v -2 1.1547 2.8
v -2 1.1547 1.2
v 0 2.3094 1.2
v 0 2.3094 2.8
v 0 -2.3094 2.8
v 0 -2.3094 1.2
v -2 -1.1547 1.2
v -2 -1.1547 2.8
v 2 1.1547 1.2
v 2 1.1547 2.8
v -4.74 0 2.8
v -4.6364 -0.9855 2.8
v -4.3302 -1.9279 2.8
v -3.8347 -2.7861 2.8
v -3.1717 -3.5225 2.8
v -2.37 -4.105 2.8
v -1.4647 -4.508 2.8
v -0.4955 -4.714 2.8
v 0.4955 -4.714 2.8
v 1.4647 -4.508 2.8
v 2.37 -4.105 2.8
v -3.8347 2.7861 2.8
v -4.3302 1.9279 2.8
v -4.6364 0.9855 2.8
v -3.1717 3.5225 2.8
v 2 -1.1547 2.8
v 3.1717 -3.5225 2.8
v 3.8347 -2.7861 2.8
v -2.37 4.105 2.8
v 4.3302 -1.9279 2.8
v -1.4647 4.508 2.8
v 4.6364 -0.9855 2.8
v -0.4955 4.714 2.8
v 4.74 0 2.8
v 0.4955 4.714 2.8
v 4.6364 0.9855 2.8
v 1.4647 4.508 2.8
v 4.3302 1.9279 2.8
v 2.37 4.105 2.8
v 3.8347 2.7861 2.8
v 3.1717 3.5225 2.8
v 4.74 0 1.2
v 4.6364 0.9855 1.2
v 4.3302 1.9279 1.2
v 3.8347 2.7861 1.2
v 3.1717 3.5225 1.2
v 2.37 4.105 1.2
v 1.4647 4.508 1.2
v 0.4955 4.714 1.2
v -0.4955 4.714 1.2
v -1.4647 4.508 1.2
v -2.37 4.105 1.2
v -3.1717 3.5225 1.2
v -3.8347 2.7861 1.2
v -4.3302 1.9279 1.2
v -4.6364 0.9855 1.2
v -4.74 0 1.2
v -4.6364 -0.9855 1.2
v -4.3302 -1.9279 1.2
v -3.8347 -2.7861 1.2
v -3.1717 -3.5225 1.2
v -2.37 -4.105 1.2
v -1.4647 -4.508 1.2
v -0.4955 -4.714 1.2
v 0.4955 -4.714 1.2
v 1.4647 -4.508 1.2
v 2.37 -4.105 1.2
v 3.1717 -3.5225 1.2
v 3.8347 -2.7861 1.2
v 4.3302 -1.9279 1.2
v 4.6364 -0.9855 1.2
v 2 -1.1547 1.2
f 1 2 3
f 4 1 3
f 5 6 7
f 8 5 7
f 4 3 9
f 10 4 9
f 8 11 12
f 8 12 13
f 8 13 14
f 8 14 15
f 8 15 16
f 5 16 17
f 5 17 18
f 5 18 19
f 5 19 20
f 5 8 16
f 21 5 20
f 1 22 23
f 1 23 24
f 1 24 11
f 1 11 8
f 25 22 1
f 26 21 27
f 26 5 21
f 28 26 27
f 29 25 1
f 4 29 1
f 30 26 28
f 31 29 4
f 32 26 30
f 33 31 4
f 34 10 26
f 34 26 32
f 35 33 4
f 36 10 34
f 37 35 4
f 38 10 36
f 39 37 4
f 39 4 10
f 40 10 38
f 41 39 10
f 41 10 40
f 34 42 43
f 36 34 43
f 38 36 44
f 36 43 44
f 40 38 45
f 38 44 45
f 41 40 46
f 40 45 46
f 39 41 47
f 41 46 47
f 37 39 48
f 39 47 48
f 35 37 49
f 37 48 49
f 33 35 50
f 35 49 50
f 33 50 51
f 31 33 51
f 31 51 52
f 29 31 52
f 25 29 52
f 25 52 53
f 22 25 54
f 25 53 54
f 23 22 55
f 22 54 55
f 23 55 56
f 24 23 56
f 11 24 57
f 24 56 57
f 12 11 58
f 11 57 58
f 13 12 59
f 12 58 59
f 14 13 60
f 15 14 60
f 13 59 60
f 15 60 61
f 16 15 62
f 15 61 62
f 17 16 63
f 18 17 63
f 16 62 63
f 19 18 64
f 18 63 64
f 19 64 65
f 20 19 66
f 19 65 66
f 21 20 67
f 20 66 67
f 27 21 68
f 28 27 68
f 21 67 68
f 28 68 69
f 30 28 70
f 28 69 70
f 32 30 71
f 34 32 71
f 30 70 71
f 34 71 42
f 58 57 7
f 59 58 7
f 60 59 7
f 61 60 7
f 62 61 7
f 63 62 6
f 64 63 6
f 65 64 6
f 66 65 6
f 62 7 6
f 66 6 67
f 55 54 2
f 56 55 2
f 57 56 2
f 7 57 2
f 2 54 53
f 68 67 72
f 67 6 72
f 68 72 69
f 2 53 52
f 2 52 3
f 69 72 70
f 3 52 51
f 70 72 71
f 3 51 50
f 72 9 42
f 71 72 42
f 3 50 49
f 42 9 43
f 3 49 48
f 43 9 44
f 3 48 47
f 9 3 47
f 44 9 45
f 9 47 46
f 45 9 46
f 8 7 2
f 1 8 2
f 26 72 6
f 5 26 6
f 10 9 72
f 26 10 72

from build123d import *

# Parameters (mm, degrees)
SKETCH1_R           = 11.85
BOSS_EXTRUDE1_DEPTH = 4
CUT_EXTRUDE1_DEPTH  = 18.229190347
SCALE1_SCALE        = 0.4


with BuildPart() as part:
    # Sketch1 → Boss-Extrude1 (new body)
    with BuildSketch(Plane.XY):
        Circle(SKETCH1_R)
    extrude(amount=BOSS_EXTRUDE1_DEPTH)

    # Sketch2 → Cut-Extrude1 (cut, through all)
    with BuildSketch(Plane(origin=(0, 0, 0), x_dir=(-1, 0, 0), z_dir=(0, 0, -1))):
        Polygon((0, 5.773502692), (-5, 2.886751346), (-5, -2.886751346), (0, -5.773502692), (5, -2.886751346), (5, 2.886751346), align=None)
    extrude(amount=-CUT_EXTRUDE1_DEPTH, mode=Mode.SUBTRACT)


with BuildPart() as part_1:
    # Scale1: scaled about (0, 0, 2)
    add(part.part.scale(SCALE1_SCALE).moved(Location((0, 0, 1.2))))


solid = part_1.part
